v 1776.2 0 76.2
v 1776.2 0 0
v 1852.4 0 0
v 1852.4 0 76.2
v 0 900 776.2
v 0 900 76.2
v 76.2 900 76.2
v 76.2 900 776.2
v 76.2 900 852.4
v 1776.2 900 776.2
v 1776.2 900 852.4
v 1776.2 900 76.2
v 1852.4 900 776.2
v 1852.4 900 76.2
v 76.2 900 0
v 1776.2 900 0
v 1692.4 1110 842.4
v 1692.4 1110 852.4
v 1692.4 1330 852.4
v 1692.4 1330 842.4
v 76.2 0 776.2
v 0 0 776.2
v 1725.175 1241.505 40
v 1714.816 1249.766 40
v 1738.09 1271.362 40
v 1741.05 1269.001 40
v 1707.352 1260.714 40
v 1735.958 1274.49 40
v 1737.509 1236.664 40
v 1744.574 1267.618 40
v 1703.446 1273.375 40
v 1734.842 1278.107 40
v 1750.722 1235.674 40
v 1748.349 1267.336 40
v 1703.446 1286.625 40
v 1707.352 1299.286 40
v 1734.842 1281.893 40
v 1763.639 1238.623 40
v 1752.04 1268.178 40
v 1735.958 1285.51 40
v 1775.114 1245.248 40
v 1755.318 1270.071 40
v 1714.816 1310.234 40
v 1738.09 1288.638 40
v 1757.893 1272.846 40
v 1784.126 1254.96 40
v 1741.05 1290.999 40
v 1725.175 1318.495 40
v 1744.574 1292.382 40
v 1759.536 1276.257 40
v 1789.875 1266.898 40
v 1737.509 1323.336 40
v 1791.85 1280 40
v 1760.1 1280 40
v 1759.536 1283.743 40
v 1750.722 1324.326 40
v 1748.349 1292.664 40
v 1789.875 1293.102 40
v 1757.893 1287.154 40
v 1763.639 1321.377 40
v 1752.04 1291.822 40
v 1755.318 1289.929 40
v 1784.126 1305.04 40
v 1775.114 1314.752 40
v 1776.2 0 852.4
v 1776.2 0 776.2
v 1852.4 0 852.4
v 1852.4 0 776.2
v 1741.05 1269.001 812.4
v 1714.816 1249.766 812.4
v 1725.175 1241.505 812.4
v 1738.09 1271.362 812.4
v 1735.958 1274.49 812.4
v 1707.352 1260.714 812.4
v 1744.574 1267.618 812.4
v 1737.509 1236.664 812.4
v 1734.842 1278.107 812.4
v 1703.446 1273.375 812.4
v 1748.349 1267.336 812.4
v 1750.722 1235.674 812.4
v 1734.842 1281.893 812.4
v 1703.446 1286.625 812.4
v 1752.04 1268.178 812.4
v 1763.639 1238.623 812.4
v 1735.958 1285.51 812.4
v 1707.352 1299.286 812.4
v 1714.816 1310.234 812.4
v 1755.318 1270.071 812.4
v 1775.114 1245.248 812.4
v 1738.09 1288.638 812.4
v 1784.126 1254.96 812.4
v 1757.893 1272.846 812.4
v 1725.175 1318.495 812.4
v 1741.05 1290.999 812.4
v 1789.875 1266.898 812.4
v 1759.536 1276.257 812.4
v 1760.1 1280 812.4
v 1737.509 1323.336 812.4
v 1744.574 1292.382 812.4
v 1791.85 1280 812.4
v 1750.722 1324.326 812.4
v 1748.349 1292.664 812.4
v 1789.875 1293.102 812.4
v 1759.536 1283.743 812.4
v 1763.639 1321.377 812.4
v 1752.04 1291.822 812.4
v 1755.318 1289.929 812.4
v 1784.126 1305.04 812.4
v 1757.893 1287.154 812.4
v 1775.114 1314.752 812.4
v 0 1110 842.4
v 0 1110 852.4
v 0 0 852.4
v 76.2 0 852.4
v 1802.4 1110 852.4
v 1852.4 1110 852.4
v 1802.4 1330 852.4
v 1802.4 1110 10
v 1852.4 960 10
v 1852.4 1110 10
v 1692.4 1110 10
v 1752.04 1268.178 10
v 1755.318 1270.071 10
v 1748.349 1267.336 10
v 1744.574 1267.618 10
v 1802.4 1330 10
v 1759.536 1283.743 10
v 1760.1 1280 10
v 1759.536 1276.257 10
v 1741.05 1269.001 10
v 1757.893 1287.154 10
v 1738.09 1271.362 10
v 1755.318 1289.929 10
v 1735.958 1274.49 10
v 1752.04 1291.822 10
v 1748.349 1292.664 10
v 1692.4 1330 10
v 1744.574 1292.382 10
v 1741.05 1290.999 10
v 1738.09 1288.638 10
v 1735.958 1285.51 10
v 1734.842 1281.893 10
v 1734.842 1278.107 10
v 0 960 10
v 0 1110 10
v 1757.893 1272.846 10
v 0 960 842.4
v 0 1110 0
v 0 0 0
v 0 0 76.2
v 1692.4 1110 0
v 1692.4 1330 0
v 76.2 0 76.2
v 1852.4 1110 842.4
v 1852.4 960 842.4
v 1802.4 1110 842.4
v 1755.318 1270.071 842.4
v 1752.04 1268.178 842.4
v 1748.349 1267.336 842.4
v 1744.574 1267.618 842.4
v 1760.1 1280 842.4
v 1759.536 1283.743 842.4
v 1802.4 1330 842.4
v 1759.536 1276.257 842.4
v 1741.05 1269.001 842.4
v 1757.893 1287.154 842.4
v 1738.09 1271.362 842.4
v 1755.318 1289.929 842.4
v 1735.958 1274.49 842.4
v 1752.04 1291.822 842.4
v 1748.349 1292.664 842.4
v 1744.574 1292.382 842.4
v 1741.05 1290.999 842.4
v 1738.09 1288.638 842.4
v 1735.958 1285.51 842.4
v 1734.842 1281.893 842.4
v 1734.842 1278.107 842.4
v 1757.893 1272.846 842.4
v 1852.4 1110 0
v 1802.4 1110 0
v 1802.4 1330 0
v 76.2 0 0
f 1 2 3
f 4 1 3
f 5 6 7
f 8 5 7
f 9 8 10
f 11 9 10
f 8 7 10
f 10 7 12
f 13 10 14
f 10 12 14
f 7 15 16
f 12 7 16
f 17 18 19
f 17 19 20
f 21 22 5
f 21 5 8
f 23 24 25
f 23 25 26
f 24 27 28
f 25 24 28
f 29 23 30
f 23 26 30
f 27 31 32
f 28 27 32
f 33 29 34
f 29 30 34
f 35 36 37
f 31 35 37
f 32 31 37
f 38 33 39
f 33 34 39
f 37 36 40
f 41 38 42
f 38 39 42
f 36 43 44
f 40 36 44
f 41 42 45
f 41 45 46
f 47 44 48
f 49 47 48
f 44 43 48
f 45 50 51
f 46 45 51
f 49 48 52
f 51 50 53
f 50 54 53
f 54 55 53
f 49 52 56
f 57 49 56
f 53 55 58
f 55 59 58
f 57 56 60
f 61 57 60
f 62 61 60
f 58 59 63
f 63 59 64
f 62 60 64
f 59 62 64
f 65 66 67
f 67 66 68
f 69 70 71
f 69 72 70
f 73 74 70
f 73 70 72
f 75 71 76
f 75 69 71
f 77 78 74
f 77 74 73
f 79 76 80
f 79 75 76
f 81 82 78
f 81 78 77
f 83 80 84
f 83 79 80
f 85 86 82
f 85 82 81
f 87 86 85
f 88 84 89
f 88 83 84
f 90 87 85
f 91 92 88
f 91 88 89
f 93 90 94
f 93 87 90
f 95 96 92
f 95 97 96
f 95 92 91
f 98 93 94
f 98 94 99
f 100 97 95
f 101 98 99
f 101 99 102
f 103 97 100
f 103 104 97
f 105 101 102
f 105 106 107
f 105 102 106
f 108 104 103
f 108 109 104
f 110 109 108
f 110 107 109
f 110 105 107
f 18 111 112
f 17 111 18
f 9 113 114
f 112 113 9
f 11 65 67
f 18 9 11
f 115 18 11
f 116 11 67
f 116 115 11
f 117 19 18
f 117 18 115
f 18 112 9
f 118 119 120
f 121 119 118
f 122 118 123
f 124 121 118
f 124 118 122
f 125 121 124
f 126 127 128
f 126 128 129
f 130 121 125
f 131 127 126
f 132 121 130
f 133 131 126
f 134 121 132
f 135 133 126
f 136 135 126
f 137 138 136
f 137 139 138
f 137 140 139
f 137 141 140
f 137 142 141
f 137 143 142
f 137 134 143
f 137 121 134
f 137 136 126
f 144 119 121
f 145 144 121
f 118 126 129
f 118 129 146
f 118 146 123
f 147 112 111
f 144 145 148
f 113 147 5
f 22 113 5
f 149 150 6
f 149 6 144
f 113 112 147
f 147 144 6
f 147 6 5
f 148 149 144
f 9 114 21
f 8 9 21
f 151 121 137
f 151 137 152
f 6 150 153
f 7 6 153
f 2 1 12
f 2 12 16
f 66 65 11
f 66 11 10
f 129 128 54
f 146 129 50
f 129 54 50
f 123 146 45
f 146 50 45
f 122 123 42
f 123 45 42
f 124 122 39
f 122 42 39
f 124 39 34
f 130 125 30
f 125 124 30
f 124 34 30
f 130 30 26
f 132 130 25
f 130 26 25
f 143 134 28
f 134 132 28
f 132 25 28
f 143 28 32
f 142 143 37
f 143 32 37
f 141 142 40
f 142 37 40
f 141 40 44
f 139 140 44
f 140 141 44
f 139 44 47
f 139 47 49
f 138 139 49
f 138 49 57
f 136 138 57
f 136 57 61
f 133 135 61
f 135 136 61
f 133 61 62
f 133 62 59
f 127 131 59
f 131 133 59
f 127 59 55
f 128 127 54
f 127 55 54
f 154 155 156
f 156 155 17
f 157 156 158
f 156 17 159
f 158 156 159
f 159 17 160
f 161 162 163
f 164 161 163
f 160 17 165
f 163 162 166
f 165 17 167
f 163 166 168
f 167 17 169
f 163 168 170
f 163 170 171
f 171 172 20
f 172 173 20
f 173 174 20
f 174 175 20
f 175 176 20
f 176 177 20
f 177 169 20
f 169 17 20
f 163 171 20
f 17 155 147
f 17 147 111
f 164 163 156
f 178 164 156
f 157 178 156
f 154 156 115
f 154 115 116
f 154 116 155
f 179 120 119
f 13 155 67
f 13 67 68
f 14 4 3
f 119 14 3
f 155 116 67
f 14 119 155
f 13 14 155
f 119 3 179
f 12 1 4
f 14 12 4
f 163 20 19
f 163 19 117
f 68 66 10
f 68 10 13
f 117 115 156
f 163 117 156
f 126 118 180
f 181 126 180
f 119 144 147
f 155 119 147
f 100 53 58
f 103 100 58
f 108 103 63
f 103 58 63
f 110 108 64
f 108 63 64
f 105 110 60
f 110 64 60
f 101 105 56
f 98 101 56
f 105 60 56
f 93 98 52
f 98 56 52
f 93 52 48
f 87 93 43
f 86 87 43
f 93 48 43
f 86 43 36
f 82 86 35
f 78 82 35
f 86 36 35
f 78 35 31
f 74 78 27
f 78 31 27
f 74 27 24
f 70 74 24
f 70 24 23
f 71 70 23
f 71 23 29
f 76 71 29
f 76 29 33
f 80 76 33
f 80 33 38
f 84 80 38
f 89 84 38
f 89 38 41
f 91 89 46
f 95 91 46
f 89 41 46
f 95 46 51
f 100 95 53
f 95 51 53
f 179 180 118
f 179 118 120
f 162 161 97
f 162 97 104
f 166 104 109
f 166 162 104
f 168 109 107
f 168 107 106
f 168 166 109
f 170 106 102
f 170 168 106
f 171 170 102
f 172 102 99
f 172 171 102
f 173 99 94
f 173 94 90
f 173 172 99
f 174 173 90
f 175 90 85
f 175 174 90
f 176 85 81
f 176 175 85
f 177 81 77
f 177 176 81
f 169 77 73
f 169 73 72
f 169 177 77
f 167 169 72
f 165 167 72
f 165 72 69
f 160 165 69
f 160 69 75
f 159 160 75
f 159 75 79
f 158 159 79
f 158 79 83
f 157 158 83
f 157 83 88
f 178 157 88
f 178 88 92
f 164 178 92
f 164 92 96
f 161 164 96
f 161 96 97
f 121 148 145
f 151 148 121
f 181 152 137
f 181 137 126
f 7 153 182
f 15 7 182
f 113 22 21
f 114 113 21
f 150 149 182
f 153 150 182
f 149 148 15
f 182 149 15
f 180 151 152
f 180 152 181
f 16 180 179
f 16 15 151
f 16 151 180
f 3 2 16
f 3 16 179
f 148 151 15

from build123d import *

# Parameters (mm, degrees)
CROQUIS2_W                = 76.2
CROQUIS2_H                = 76.2
SALIENTE_EXTRUIR1_DEPTH   = 900
SALIENTE_EXTRUIR1_2_DEPTH = 900
SALIENTE_EXTRUIR1_3_DEPTH = 900
SALIENTE_EXTRUIR1_4_DEPTH = 900
CROQUIS3_W                = 1852.4
CROQUIS3_H                = 852.4
SALIENTE_EXTRUIR2_DEPTH   = 210
CROQUIS4_W                = 832.4
CROQUIS4_H                = 150
CORTAR_EXTRUIR1_DEPTH     = 1852.4
CROQUIS5_W                = 110
CROQUIS5_H                = 10
SALIENTE_EXTRUIR3_DEPTH   = 220
CROQUIS6_R                = 12.7
SALIENTE_EXTRUIR4_DEPTH   = 40
SALIENTE_EXTRUIR5_START   = -40
CROQUIS7_R                = 12.7
SALIENTE_EXTRUIR5_DEPTH   = 40
CROQUIS8_R                = 44.45
SALIENTE_EXTRUIR6_DEPTH   = 772.4


with BuildPart() as part:
    # Croquis2 → Saliente-Extruir1 (new body)
    with BuildSketch(Plane(origin=(0, 0, 0), x_dir=(1, 0, 0), z_dir=(0, 1, 0))):
        with Locations((38.1, -38.1)):
            Rectangle(CROQUIS2_W, CROQUIS2_H)
    extrude(amount=SALIENTE_EXTRUIR1_DEPTH)



with BuildPart() as body_2:
    # Croquis2 → Saliente-Extruir1 2 (new body)
    with BuildSketch(Plane(origin=(0, 0, 0), x_dir=(1, 0, 0), z_dir=(0, 1, 0))):
        with Locations((1814.3, -38.1)):
            Rectangle(CROQUIS2_W, CROQUIS2_H)
    extrude(amount=SALIENTE_EXTRUIR1_2_DEPTH)


with BuildPart() as body_3:
    # Croquis2 → Saliente-Extruir1 3 (new body)
    with BuildSketch(Plane(origin=(0, 0, 0), x_dir=(1, 0, 0), z_dir=(0, 1, 0))):
        with Locations((1814.3, -814.3)):
            Rectangle(CROQUIS2_W, CROQUIS2_H)
    extrude(amount=SALIENTE_EXTRUIR1_3_DEPTH)


with BuildPart() as body_4:
    # Croquis2 → Saliente-Extruir1 4 (new body)
    with BuildSketch(Plane(origin=(0, 0, 0), x_dir=(1, 0, 0), z_dir=(0, 1, 0))):
        with Locations((38.1, -814.3)):
            Rectangle(CROQUIS2_W, CROQUIS2_H)
    extrude(amount=SALIENTE_EXTRUIR1_4_DEPTH)


with BuildPart() as part_1:
    add(part.part)

    add(body_2.part)  # Saliente-Extruir2 merges body 2

    add(body_3.part)  # Saliente-Extruir2 merges body 3

    add(body_4.part)  # Saliente-Extruir2 merges body 4
    # Croquis3 → Saliente-Extruir2 (add)
    with BuildSketch(Plane(origin=(0, 900, 0), x_dir=(1, 0, 0), z_dir=(0, 1, 0))):
        with Locations((926.2, -426.2)):
            Rectangle(CROQUIS3_W, CROQUIS3_H)
    extrude(amount=SALIENTE_EXTRUIR2_DEPTH)

    # Croquis4 → Cortar-Extruir1 (cut)
    with BuildSketch(Plane.ZY):
        with Locations((426.2, 1035)):
            Rectangle(CROQUIS4_W, CROQUIS4_H)
    extrude(amount=-CORTAR_EXTRUIR1_DEPTH, mode=Mode.SUBTRACT)

    # Croquis5 → Saliente-Extruir3 (add)
    with BuildSketch(Plane(origin=(0, 1110, 0), x_dir=(1, 0, 0), z_dir=(0, 1, 0))):
        with Locations((1747.4, -5)):
            Rectangle(CROQUIS5_W, CROQUIS5_H)
        with Locations((1747.4, -847.4)):
            Rectangle(CROQUIS5_W, CROQUIS5_H)
    extrude(amount=SALIENTE_EXTRUIR3_DEPTH)

    # Croquis6 → Saliente-Extruir4 (add)
    with BuildSketch(Plane.XY.offset(852.4)):
        with Locations((1747.4, 1280)):
            Circle(CROQUIS6_R)
    extrude(amount=-SALIENTE_EXTRUIR4_DEPTH)

    # Croquis7 → Saliente-Extruir5 (add)
    with BuildSketch(Plane(origin=(0, 0, 0), x_dir=(-1, 0, 0), z_dir=(0, 0, -1)).offset(SALIENTE_EXTRUIR5_START)):
        with Locations(Location((-1747.4, 1280, 0), (0, 0, 180))):
            Circle(CROQUIS7_R)
    extrude(amount=SALIENTE_EXTRUIR5_DEPTH)

    # Croquis8 → Saliente-Extruir6 (add)
    with BuildSketch(Plane.XY.offset(40)):
        with Locations((1747.4, 1280)):
            Circle(CROQUIS8_R)
    extrude(amount=SALIENTE_EXTRUIR6_DEPTH)


solid = part_1.part
